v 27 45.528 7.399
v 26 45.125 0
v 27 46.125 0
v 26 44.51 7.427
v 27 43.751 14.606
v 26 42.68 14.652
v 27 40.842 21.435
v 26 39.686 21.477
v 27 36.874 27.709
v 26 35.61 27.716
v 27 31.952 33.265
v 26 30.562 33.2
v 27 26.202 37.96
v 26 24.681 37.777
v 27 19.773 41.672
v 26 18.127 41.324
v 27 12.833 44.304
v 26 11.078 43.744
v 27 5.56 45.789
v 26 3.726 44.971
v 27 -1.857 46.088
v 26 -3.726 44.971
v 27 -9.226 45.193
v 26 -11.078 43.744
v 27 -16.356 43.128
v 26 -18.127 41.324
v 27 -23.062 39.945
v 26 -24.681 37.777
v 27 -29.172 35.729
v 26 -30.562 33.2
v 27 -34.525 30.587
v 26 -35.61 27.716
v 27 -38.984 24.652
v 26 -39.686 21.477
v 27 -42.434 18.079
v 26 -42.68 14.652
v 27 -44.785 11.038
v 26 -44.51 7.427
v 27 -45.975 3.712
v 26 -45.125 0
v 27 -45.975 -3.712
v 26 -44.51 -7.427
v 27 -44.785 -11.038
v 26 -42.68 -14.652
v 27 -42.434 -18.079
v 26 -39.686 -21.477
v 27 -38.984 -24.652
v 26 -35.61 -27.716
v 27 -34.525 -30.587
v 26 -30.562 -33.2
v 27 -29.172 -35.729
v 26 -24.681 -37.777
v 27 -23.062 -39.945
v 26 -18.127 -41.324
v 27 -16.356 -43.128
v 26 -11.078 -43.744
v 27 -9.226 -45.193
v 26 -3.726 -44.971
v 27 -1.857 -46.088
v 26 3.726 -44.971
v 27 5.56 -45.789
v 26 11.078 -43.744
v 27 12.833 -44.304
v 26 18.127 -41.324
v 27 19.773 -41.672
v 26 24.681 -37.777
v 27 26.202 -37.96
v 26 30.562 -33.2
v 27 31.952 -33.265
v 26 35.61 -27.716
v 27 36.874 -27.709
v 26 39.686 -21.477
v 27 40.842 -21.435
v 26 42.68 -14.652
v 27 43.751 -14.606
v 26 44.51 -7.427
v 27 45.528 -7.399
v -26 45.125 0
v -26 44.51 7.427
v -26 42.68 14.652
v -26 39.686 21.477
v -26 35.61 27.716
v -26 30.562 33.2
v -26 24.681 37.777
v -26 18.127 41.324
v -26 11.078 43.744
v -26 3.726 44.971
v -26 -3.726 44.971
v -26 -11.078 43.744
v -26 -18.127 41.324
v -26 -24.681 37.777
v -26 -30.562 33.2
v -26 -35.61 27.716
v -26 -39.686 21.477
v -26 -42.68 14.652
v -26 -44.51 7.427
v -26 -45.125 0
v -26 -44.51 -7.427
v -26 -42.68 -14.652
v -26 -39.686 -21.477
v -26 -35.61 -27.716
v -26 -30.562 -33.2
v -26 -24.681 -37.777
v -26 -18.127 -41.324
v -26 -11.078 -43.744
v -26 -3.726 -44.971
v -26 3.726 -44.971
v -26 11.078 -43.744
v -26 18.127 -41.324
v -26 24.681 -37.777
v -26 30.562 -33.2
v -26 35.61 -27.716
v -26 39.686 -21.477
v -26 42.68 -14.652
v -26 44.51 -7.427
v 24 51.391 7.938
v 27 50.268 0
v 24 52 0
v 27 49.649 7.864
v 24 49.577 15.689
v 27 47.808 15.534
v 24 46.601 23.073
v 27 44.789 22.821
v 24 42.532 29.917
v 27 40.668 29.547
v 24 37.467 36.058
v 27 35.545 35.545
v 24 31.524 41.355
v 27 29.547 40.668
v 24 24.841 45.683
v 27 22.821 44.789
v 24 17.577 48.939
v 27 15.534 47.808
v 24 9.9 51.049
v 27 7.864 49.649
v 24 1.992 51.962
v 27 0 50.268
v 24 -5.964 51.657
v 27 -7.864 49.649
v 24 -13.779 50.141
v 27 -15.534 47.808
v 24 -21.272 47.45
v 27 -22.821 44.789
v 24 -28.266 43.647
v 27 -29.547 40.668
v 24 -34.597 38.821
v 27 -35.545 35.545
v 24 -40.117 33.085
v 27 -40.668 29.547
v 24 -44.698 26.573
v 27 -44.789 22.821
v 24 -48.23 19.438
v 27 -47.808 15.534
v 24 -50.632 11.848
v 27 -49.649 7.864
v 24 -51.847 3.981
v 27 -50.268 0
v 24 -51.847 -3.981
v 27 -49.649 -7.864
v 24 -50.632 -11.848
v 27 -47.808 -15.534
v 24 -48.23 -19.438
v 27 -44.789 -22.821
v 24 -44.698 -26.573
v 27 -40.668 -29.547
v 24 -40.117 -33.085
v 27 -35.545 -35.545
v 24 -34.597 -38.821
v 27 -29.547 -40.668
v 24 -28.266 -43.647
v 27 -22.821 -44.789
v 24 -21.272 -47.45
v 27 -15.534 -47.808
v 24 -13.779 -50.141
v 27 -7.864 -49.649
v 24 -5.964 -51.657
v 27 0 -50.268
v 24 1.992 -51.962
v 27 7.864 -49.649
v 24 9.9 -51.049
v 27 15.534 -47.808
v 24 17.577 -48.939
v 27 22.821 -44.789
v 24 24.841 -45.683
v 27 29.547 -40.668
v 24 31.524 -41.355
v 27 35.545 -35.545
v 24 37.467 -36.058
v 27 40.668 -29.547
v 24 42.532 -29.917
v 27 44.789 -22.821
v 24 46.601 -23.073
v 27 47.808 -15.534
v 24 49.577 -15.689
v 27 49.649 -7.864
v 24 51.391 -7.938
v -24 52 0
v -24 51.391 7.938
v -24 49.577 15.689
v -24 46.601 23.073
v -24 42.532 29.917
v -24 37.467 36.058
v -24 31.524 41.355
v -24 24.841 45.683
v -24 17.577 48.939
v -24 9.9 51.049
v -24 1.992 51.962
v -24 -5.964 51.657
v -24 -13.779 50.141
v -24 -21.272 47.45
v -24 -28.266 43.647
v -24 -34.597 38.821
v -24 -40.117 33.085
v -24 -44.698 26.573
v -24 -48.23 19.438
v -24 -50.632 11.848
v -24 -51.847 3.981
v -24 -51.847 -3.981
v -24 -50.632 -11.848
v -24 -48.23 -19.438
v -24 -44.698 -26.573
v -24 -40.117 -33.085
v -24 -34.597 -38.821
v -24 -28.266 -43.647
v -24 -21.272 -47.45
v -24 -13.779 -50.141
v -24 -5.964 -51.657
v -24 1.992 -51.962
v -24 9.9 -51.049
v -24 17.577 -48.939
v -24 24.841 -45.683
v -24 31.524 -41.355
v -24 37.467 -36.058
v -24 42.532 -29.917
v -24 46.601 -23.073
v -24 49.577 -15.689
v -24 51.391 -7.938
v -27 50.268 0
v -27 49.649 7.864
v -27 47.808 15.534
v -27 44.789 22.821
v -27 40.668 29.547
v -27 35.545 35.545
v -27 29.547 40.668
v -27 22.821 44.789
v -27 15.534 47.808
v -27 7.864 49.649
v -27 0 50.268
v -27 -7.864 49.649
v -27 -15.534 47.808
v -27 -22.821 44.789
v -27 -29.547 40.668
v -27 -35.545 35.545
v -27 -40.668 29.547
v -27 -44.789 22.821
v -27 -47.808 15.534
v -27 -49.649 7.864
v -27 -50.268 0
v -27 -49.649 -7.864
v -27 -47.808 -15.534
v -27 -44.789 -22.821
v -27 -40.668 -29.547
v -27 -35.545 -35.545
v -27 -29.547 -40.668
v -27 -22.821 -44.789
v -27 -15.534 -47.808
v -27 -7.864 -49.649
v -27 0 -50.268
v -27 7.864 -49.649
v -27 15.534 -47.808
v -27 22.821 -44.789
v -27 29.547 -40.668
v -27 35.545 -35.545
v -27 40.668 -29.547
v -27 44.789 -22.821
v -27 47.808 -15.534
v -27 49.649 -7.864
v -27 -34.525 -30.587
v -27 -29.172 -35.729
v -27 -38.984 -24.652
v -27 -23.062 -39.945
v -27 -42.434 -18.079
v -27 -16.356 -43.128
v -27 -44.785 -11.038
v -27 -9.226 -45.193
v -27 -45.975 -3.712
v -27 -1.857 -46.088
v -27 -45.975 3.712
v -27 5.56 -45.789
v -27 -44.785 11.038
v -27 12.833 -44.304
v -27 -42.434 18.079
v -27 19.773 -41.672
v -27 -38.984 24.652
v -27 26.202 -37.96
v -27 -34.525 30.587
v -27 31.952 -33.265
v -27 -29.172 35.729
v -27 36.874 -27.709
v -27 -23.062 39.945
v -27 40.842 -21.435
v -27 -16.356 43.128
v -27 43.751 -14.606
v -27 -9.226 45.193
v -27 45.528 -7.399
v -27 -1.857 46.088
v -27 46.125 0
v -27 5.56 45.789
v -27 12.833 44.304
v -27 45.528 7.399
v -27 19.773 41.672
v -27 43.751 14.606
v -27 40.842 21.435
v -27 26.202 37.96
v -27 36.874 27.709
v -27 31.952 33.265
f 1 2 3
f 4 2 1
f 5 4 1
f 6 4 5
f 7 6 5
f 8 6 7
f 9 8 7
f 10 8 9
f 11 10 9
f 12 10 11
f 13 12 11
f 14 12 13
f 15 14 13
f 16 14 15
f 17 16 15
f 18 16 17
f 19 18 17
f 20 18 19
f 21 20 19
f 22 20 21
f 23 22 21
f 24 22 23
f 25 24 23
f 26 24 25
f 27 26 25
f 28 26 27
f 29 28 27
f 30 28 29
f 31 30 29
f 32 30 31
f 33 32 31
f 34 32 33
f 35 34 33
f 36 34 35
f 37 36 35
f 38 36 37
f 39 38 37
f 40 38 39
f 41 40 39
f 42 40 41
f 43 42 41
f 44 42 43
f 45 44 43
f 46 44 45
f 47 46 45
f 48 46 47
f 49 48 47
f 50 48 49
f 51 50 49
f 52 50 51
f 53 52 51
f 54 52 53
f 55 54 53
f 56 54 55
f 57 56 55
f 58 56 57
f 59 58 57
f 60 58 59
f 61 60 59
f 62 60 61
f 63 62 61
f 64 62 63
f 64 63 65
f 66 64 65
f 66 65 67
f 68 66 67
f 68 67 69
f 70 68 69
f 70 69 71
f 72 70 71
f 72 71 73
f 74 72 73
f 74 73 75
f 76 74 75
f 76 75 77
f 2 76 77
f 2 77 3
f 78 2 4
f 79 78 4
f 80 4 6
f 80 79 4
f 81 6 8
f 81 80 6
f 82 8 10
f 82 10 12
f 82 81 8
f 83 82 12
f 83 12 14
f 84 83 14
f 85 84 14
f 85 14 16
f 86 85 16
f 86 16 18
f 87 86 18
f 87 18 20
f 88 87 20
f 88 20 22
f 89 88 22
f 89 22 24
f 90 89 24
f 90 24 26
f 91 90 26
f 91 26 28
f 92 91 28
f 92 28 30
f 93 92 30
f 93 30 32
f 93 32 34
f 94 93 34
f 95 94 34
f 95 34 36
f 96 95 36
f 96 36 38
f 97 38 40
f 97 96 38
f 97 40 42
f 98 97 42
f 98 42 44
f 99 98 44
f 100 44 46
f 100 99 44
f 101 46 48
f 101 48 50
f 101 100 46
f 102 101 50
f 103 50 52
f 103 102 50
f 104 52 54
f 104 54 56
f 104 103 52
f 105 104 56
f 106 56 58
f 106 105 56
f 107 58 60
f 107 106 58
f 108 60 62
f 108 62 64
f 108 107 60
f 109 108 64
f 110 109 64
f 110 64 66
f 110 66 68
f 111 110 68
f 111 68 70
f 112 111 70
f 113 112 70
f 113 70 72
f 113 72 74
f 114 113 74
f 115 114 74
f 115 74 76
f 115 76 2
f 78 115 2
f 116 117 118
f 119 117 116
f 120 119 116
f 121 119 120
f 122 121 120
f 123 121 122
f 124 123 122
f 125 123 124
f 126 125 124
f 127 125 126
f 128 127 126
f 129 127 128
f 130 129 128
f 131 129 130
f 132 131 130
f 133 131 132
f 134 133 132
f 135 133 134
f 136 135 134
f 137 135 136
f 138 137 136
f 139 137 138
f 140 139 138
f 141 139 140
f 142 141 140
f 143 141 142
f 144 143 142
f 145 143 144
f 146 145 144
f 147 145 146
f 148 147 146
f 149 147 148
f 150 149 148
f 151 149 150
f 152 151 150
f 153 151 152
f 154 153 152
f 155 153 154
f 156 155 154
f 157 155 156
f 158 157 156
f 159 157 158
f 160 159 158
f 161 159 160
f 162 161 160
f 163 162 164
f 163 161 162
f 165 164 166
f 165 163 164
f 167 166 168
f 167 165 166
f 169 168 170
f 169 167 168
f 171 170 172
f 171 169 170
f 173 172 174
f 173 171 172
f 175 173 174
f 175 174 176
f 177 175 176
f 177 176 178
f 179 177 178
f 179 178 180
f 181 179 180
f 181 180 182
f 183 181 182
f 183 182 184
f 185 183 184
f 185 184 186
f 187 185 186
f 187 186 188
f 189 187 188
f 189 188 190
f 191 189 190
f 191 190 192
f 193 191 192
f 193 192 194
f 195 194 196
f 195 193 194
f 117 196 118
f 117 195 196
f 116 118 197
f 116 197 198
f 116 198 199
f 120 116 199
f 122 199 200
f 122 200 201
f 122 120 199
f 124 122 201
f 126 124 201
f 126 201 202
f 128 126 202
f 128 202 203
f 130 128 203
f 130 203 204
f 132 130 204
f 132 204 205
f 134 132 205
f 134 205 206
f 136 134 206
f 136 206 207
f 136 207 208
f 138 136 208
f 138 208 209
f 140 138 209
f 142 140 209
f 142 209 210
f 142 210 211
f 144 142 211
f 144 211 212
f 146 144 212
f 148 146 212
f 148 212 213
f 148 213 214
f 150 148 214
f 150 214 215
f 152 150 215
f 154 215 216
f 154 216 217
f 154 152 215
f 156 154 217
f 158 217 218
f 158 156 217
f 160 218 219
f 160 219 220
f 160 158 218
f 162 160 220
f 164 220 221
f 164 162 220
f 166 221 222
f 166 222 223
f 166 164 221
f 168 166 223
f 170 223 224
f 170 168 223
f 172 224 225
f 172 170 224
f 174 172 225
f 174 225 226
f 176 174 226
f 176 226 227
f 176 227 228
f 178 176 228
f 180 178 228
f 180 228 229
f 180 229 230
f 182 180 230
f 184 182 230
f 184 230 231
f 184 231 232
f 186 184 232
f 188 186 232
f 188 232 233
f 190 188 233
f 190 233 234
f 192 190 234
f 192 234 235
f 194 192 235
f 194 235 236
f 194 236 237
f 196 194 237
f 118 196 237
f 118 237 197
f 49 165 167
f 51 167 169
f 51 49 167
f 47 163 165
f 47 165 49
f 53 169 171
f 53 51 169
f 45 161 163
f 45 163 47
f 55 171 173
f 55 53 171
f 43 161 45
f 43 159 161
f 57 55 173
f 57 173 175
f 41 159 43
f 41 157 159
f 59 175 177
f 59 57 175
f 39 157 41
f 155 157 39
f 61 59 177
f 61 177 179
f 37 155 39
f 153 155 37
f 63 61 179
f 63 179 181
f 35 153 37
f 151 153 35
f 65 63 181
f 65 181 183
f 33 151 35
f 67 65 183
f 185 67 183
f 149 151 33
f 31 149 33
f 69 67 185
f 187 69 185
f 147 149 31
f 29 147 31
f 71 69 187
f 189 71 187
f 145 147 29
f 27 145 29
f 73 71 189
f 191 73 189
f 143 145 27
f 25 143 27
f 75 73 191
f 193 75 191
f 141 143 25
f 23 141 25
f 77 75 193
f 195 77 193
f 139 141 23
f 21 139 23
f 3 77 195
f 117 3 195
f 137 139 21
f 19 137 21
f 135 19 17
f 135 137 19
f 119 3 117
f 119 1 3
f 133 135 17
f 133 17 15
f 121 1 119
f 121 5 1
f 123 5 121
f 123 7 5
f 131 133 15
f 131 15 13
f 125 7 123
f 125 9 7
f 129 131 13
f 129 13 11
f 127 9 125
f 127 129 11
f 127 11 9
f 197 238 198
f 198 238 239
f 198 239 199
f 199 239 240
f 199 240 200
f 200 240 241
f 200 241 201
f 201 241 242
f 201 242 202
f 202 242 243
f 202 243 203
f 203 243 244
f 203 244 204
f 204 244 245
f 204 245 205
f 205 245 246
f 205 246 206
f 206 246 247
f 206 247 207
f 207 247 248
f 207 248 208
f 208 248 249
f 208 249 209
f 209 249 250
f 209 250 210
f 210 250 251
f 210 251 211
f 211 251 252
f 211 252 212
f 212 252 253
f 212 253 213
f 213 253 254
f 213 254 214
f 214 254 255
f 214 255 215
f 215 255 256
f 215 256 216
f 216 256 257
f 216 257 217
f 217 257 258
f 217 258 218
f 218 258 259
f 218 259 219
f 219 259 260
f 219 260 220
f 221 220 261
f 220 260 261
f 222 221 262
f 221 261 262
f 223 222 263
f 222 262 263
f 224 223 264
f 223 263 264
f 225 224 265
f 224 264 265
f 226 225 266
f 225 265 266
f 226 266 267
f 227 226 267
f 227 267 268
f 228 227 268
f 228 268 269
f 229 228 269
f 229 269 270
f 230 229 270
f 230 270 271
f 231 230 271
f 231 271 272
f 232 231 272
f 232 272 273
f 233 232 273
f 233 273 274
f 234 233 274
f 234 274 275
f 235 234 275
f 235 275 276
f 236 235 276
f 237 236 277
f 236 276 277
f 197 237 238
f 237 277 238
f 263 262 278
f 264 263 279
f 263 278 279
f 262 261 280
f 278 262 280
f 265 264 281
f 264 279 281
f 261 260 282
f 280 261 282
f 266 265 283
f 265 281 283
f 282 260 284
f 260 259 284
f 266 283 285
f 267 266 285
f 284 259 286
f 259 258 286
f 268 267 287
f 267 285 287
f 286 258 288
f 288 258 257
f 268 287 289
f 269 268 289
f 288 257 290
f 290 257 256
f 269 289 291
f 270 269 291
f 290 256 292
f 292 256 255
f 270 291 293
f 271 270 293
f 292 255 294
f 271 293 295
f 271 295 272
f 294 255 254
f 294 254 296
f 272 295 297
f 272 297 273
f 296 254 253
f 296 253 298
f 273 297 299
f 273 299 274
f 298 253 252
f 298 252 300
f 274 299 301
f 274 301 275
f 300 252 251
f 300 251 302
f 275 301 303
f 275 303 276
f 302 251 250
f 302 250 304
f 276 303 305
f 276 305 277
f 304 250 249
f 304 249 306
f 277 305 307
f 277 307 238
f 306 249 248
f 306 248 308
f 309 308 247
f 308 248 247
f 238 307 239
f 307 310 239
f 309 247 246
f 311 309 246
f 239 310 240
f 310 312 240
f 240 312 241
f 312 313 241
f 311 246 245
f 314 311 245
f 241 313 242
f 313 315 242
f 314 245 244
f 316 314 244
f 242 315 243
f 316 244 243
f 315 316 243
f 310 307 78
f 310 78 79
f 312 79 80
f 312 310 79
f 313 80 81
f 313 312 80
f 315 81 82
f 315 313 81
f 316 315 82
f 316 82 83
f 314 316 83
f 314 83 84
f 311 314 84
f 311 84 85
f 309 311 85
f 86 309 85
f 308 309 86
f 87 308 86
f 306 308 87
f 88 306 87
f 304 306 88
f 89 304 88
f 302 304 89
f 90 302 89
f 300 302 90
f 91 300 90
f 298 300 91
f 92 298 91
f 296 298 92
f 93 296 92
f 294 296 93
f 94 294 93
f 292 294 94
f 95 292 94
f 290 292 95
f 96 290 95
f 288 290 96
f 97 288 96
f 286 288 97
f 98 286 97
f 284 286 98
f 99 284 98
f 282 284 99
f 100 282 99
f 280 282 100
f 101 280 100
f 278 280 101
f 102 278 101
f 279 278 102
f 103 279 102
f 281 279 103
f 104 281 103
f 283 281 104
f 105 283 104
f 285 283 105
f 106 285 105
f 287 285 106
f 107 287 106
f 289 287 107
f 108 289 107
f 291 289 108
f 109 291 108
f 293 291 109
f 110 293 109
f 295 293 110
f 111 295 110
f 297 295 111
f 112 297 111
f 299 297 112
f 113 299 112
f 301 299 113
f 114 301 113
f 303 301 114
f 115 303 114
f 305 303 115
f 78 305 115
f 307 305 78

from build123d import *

# Parameters (mm, degrees)
F0_R     = 52
F0_R_2   = 45.125
F1_DEPTH = 27
F2_SIZE  = 1
F3_SIZE2 = 1.7320508076
F3_SIZE  = 3


with BuildPart() as f1:
    # F0 (on Right) → F1 (new body, symmetric)
    with BuildSketch(Plane.YZ):
        Circle(F0_R)
        Circle(F0_R_2, mode=Mode.SUBTRACT)
    extrude(amount=F1_DEPTH, both=True)

    # F2
    f2_edges = [f1.edges().sort_by_distance(p)[0] for p in [
        (27, -45.125, 0),
        (-27, -45.125, 0),
    ]]
    chamfer(f2_edges, length=F2_SIZE)

    # F3
    f3_edges = [f1.edges().sort_by_distance(p)[0] for p in [
        (-27, -52, 0),
        (27, -52, 0),
    ]]
    f3_side = f1.faces().sort_by_distance((0, -52, 0))[0]
    chamfer(f3_edges, length=F3_SIZE, length2=F3_SIZE2, reference=f3_side)


solid = f1.part
